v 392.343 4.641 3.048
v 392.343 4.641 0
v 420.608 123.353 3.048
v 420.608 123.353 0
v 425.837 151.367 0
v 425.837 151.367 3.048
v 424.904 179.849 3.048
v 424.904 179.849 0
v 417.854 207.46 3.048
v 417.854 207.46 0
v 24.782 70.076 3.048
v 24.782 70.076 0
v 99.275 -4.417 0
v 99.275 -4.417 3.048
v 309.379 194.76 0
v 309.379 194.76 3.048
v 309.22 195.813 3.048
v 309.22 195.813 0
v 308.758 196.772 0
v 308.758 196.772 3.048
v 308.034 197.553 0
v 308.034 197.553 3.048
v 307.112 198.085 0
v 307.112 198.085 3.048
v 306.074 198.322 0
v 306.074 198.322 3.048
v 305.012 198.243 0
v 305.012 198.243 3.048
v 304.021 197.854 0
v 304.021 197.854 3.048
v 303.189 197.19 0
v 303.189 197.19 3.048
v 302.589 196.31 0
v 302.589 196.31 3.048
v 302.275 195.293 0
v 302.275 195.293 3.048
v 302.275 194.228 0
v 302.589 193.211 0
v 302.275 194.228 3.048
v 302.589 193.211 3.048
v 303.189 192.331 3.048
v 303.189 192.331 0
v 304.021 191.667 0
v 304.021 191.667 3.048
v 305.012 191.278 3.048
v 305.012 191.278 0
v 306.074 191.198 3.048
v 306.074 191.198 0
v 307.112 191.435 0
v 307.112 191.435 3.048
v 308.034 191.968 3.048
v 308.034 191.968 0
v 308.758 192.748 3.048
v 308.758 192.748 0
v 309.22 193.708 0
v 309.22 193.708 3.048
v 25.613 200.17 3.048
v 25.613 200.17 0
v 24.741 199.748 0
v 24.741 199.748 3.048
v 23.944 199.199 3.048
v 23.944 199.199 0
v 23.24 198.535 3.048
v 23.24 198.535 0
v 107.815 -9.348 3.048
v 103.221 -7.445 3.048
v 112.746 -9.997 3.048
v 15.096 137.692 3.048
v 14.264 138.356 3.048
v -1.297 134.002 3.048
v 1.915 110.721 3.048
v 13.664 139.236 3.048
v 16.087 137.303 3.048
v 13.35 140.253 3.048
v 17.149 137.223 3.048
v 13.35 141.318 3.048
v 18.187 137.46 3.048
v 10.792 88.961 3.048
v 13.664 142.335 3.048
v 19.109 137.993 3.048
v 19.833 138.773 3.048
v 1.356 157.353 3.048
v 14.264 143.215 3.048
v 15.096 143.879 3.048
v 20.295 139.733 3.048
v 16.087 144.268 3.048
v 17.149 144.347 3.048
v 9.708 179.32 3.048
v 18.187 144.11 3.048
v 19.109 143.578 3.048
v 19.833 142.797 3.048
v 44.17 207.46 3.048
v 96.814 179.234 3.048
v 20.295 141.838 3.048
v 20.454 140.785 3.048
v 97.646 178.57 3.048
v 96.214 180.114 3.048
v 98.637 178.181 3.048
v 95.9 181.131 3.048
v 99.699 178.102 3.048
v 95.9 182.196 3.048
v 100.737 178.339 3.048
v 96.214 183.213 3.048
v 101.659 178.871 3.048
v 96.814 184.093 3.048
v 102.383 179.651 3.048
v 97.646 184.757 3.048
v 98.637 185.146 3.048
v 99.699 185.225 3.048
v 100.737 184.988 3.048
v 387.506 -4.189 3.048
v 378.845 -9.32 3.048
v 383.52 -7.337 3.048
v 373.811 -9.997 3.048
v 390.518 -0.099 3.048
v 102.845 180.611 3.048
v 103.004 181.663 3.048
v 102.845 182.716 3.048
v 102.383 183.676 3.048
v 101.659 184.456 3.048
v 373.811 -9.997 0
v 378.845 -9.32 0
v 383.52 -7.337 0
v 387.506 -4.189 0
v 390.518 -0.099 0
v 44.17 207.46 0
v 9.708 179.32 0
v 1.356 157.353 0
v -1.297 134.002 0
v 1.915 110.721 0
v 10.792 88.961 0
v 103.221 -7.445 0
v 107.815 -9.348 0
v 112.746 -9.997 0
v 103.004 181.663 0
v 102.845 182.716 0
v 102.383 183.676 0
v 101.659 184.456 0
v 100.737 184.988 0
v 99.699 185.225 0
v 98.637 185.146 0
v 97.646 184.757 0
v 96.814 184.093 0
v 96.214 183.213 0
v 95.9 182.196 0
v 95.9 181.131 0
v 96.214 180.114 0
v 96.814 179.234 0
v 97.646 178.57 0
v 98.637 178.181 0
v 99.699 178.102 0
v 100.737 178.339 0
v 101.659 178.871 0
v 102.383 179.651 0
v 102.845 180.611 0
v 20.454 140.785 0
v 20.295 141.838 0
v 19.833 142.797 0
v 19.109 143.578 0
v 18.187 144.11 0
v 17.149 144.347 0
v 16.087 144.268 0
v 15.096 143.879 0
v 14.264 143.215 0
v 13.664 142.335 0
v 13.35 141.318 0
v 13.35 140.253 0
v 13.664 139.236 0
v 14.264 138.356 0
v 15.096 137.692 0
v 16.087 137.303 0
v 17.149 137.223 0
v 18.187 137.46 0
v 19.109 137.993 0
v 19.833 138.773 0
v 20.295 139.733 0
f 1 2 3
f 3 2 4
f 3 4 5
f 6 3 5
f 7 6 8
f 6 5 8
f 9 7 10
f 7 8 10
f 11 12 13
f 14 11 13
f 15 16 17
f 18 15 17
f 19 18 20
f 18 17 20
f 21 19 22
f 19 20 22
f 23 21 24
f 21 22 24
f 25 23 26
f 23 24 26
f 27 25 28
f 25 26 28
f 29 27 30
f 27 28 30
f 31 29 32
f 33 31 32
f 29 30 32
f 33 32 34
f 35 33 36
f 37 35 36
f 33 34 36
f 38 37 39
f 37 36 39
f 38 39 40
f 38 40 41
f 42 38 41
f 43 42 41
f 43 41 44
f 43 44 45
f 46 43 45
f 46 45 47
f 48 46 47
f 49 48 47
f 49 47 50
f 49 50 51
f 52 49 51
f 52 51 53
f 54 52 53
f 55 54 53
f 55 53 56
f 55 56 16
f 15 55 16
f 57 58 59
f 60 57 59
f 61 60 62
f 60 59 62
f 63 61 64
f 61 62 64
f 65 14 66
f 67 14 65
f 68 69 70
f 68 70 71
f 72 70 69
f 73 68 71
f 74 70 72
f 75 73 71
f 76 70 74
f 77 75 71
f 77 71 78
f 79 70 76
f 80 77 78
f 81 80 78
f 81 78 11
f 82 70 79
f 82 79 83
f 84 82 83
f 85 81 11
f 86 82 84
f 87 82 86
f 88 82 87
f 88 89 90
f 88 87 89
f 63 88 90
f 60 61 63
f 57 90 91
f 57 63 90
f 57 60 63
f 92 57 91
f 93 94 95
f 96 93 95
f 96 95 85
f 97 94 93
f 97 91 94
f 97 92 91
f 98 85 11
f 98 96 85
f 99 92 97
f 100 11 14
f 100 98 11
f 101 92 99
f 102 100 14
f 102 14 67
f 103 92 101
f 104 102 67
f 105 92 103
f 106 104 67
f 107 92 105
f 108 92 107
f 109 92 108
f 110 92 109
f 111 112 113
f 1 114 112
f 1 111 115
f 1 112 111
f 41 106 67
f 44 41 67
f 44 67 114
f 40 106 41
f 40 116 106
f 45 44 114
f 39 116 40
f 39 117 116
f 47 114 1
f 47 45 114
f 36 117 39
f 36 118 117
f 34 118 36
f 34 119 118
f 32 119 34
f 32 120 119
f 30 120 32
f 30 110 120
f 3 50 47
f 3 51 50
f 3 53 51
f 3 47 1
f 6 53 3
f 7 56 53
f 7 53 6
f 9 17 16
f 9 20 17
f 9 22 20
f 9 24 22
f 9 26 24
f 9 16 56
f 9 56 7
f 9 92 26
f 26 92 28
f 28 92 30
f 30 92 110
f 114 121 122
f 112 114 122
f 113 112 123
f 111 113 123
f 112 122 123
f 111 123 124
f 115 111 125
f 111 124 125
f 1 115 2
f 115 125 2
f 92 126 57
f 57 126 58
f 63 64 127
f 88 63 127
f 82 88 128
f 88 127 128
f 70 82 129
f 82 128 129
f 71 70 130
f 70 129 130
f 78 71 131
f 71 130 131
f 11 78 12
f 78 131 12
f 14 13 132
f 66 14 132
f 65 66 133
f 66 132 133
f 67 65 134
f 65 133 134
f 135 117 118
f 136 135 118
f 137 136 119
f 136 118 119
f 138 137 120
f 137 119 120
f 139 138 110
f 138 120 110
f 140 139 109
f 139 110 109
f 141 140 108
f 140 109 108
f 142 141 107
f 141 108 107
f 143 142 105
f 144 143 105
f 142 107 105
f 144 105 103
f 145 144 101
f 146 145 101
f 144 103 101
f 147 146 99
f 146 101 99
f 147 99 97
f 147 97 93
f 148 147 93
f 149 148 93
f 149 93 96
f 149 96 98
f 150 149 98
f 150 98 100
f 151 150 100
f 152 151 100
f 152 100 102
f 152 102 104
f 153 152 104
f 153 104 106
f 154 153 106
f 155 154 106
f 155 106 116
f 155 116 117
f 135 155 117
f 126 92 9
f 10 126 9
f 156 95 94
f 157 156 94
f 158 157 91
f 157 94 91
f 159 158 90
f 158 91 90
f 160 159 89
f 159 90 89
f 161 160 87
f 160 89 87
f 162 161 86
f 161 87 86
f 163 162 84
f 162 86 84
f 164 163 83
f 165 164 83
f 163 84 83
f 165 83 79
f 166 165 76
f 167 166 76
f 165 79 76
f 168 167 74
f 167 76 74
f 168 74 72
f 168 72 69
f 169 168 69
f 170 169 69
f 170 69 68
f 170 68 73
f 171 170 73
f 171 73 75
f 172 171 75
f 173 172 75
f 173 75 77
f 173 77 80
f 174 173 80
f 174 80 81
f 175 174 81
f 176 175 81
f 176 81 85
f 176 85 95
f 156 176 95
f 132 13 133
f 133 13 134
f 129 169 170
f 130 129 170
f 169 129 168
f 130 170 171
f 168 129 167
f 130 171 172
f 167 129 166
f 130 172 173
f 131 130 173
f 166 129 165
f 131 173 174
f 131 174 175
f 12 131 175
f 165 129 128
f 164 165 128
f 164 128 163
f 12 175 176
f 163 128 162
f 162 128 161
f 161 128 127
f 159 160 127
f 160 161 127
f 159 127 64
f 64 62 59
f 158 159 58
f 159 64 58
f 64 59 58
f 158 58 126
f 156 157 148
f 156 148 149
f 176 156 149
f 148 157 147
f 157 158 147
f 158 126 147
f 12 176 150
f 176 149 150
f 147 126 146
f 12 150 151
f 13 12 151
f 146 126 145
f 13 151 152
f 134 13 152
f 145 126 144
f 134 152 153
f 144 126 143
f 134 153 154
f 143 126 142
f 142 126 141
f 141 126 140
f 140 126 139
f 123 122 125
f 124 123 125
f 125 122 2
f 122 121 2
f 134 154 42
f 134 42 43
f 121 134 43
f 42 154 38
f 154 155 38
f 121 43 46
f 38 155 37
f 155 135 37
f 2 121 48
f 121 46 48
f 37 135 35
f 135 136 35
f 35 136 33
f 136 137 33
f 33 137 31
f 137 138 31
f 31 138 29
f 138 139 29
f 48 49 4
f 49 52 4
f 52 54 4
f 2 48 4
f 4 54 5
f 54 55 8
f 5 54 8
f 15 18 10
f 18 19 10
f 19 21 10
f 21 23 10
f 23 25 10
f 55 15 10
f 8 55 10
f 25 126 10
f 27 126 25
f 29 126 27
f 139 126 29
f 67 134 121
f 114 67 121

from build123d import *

# Parameters (mm, degrees)
F1_DEPTH = 3.048
F2_R     = 2.38125
F3_DEPTH = 3.048
F4_R     = 3.571875
F5_DEPTH = 9.525
F6_R     = 2.38125
F7_DEPTH = 6.35


with BuildPart() as f1:
    # F0 (on Top) → F1 (new body)
    with BuildSketch(Plane.XY):
        with BuildLine():
            Line((356.6070268588, 293.1853402508), (89.9070268588, 293.1853402508))
            Line((89.9070268588, 293.1853402508), (89.9070268588, 230.838141456))
            ThreePointArc((89.9070268588, 230.838141456), (88.5285448509, 226.3678853975), (84.8718925649, 223.4503014769))
            Line((84.8718925649, 223.4503014769), (25.6127064183, 200.1699069193))
            ThreePointArc((25.6127064183, 200.1699069193), (24.3322333387, 199.4889237751), (23.2396710643, 198.5351643577))
            ThreePointArc((23.2396710643, 198.5351643577), (-1.2970857024, 134.0019257775), (24.7815527961, 70.0762194589))
            Line((24.7815527961, 70.0762194589), (99.2751600757, -4.4173878207))
            ThreePointArc((99.2751600757, -4.4173878207), (105.4554248707, -8.5469087335), (112.7455442573, -9.9970036391))
            Line((112.7455442573, -9.9970036391), (373.8109154673, -9.9970036391))
            ThreePointArc((373.8109154673, -9.9970036391), (385.6186847653, -5.8962204817), (392.3428738571, 4.6406253157))
            Line((392.3428738571, 4.6406253157), (420.6077241059, 123.3529963609))
            ThreePointArc((420.6077241059, 123.3529963609), (416.1467307829, 211.7798908878), (356.6070268588, 277.3103402508))
            Line((356.6070268588, 277.3103402508), (356.6070268588, 293.1853402508))
        make_face()
    extrude(amount=F1_DEPTH)

    # F2 (on face) → F3 (cut, through all)
    with BuildSketch(Plane.XY.offset(3.048)):
        with Locations((261.3570268588, 283.6603402508)):
            Circle(F2_R)
        with Locations((197.8570268588, 283.6603402508)):
            Circle(F2_R)
        with Locations((134.3570268588, 283.6603402508)):
            Circle(F2_R)
    extrude(amount=-F3_DEPTH, mode=Mode.SUBTRACT)

    # F4 (on face) → F5 (cut)
    with BuildSketch(Plane.XY.offset(3.048)):
        with Locations((99.4320268588, 181.6634652508)):
            Circle(F4_R)
        with Locations((16.8820268588, 140.7853402508)):
            Circle(F4_R)
        with Locations((305.8070268588, 194.7603402508)):
            Circle(F4_R)
    extrude(amount=-F5_DEPTH, mode=Mode.SUBTRACT)

    # F6 (on face) → F7 (cut)
    with BuildSketch(Plane.XY.offset(3.048)):
        with BuildLine():
            Line((44.1701730803, 207.4603402508), (417.85350826, 207.4603402508))
            ThreePointArc((417.85350826, 207.4603402508), (393.6078526777, 247.9773896185), (356.6070268588, 277.3103402508))
            Line((356.6070268588, 277.3103402508), (356.6070268588, 293.1853402508))
            Line((356.6070268588, 293.1853402508), (89.9070268588, 293.1853402508))
            Line((89.9070268588, 293.1853402508), (89.9070268588, 230.838141456))
            ThreePointArc((89.9070268588, 230.838141456), (88.5285448509, 226.3678853975), (84.8718925649, 223.4503014769))
            Line((84.8718925649, 223.4503014769), (44.1701730803, 207.4603402508))
        make_face()
        with Locations((134.3570268588, 283.6603402508)):
            Circle(F6_R, mode=Mode.SUBTRACT)
        with Locations((197.8570268588, 283.6603402508)):
            Circle(F6_R, mode=Mode.SUBTRACT)
        with Locations((261.3570268588, 283.6603402508)):
            Circle(F6_R, mode=Mode.SUBTRACT)
    extrude(amount=-F7_DEPTH, mode=Mode.SUBTRACT)


solid = f1.part
